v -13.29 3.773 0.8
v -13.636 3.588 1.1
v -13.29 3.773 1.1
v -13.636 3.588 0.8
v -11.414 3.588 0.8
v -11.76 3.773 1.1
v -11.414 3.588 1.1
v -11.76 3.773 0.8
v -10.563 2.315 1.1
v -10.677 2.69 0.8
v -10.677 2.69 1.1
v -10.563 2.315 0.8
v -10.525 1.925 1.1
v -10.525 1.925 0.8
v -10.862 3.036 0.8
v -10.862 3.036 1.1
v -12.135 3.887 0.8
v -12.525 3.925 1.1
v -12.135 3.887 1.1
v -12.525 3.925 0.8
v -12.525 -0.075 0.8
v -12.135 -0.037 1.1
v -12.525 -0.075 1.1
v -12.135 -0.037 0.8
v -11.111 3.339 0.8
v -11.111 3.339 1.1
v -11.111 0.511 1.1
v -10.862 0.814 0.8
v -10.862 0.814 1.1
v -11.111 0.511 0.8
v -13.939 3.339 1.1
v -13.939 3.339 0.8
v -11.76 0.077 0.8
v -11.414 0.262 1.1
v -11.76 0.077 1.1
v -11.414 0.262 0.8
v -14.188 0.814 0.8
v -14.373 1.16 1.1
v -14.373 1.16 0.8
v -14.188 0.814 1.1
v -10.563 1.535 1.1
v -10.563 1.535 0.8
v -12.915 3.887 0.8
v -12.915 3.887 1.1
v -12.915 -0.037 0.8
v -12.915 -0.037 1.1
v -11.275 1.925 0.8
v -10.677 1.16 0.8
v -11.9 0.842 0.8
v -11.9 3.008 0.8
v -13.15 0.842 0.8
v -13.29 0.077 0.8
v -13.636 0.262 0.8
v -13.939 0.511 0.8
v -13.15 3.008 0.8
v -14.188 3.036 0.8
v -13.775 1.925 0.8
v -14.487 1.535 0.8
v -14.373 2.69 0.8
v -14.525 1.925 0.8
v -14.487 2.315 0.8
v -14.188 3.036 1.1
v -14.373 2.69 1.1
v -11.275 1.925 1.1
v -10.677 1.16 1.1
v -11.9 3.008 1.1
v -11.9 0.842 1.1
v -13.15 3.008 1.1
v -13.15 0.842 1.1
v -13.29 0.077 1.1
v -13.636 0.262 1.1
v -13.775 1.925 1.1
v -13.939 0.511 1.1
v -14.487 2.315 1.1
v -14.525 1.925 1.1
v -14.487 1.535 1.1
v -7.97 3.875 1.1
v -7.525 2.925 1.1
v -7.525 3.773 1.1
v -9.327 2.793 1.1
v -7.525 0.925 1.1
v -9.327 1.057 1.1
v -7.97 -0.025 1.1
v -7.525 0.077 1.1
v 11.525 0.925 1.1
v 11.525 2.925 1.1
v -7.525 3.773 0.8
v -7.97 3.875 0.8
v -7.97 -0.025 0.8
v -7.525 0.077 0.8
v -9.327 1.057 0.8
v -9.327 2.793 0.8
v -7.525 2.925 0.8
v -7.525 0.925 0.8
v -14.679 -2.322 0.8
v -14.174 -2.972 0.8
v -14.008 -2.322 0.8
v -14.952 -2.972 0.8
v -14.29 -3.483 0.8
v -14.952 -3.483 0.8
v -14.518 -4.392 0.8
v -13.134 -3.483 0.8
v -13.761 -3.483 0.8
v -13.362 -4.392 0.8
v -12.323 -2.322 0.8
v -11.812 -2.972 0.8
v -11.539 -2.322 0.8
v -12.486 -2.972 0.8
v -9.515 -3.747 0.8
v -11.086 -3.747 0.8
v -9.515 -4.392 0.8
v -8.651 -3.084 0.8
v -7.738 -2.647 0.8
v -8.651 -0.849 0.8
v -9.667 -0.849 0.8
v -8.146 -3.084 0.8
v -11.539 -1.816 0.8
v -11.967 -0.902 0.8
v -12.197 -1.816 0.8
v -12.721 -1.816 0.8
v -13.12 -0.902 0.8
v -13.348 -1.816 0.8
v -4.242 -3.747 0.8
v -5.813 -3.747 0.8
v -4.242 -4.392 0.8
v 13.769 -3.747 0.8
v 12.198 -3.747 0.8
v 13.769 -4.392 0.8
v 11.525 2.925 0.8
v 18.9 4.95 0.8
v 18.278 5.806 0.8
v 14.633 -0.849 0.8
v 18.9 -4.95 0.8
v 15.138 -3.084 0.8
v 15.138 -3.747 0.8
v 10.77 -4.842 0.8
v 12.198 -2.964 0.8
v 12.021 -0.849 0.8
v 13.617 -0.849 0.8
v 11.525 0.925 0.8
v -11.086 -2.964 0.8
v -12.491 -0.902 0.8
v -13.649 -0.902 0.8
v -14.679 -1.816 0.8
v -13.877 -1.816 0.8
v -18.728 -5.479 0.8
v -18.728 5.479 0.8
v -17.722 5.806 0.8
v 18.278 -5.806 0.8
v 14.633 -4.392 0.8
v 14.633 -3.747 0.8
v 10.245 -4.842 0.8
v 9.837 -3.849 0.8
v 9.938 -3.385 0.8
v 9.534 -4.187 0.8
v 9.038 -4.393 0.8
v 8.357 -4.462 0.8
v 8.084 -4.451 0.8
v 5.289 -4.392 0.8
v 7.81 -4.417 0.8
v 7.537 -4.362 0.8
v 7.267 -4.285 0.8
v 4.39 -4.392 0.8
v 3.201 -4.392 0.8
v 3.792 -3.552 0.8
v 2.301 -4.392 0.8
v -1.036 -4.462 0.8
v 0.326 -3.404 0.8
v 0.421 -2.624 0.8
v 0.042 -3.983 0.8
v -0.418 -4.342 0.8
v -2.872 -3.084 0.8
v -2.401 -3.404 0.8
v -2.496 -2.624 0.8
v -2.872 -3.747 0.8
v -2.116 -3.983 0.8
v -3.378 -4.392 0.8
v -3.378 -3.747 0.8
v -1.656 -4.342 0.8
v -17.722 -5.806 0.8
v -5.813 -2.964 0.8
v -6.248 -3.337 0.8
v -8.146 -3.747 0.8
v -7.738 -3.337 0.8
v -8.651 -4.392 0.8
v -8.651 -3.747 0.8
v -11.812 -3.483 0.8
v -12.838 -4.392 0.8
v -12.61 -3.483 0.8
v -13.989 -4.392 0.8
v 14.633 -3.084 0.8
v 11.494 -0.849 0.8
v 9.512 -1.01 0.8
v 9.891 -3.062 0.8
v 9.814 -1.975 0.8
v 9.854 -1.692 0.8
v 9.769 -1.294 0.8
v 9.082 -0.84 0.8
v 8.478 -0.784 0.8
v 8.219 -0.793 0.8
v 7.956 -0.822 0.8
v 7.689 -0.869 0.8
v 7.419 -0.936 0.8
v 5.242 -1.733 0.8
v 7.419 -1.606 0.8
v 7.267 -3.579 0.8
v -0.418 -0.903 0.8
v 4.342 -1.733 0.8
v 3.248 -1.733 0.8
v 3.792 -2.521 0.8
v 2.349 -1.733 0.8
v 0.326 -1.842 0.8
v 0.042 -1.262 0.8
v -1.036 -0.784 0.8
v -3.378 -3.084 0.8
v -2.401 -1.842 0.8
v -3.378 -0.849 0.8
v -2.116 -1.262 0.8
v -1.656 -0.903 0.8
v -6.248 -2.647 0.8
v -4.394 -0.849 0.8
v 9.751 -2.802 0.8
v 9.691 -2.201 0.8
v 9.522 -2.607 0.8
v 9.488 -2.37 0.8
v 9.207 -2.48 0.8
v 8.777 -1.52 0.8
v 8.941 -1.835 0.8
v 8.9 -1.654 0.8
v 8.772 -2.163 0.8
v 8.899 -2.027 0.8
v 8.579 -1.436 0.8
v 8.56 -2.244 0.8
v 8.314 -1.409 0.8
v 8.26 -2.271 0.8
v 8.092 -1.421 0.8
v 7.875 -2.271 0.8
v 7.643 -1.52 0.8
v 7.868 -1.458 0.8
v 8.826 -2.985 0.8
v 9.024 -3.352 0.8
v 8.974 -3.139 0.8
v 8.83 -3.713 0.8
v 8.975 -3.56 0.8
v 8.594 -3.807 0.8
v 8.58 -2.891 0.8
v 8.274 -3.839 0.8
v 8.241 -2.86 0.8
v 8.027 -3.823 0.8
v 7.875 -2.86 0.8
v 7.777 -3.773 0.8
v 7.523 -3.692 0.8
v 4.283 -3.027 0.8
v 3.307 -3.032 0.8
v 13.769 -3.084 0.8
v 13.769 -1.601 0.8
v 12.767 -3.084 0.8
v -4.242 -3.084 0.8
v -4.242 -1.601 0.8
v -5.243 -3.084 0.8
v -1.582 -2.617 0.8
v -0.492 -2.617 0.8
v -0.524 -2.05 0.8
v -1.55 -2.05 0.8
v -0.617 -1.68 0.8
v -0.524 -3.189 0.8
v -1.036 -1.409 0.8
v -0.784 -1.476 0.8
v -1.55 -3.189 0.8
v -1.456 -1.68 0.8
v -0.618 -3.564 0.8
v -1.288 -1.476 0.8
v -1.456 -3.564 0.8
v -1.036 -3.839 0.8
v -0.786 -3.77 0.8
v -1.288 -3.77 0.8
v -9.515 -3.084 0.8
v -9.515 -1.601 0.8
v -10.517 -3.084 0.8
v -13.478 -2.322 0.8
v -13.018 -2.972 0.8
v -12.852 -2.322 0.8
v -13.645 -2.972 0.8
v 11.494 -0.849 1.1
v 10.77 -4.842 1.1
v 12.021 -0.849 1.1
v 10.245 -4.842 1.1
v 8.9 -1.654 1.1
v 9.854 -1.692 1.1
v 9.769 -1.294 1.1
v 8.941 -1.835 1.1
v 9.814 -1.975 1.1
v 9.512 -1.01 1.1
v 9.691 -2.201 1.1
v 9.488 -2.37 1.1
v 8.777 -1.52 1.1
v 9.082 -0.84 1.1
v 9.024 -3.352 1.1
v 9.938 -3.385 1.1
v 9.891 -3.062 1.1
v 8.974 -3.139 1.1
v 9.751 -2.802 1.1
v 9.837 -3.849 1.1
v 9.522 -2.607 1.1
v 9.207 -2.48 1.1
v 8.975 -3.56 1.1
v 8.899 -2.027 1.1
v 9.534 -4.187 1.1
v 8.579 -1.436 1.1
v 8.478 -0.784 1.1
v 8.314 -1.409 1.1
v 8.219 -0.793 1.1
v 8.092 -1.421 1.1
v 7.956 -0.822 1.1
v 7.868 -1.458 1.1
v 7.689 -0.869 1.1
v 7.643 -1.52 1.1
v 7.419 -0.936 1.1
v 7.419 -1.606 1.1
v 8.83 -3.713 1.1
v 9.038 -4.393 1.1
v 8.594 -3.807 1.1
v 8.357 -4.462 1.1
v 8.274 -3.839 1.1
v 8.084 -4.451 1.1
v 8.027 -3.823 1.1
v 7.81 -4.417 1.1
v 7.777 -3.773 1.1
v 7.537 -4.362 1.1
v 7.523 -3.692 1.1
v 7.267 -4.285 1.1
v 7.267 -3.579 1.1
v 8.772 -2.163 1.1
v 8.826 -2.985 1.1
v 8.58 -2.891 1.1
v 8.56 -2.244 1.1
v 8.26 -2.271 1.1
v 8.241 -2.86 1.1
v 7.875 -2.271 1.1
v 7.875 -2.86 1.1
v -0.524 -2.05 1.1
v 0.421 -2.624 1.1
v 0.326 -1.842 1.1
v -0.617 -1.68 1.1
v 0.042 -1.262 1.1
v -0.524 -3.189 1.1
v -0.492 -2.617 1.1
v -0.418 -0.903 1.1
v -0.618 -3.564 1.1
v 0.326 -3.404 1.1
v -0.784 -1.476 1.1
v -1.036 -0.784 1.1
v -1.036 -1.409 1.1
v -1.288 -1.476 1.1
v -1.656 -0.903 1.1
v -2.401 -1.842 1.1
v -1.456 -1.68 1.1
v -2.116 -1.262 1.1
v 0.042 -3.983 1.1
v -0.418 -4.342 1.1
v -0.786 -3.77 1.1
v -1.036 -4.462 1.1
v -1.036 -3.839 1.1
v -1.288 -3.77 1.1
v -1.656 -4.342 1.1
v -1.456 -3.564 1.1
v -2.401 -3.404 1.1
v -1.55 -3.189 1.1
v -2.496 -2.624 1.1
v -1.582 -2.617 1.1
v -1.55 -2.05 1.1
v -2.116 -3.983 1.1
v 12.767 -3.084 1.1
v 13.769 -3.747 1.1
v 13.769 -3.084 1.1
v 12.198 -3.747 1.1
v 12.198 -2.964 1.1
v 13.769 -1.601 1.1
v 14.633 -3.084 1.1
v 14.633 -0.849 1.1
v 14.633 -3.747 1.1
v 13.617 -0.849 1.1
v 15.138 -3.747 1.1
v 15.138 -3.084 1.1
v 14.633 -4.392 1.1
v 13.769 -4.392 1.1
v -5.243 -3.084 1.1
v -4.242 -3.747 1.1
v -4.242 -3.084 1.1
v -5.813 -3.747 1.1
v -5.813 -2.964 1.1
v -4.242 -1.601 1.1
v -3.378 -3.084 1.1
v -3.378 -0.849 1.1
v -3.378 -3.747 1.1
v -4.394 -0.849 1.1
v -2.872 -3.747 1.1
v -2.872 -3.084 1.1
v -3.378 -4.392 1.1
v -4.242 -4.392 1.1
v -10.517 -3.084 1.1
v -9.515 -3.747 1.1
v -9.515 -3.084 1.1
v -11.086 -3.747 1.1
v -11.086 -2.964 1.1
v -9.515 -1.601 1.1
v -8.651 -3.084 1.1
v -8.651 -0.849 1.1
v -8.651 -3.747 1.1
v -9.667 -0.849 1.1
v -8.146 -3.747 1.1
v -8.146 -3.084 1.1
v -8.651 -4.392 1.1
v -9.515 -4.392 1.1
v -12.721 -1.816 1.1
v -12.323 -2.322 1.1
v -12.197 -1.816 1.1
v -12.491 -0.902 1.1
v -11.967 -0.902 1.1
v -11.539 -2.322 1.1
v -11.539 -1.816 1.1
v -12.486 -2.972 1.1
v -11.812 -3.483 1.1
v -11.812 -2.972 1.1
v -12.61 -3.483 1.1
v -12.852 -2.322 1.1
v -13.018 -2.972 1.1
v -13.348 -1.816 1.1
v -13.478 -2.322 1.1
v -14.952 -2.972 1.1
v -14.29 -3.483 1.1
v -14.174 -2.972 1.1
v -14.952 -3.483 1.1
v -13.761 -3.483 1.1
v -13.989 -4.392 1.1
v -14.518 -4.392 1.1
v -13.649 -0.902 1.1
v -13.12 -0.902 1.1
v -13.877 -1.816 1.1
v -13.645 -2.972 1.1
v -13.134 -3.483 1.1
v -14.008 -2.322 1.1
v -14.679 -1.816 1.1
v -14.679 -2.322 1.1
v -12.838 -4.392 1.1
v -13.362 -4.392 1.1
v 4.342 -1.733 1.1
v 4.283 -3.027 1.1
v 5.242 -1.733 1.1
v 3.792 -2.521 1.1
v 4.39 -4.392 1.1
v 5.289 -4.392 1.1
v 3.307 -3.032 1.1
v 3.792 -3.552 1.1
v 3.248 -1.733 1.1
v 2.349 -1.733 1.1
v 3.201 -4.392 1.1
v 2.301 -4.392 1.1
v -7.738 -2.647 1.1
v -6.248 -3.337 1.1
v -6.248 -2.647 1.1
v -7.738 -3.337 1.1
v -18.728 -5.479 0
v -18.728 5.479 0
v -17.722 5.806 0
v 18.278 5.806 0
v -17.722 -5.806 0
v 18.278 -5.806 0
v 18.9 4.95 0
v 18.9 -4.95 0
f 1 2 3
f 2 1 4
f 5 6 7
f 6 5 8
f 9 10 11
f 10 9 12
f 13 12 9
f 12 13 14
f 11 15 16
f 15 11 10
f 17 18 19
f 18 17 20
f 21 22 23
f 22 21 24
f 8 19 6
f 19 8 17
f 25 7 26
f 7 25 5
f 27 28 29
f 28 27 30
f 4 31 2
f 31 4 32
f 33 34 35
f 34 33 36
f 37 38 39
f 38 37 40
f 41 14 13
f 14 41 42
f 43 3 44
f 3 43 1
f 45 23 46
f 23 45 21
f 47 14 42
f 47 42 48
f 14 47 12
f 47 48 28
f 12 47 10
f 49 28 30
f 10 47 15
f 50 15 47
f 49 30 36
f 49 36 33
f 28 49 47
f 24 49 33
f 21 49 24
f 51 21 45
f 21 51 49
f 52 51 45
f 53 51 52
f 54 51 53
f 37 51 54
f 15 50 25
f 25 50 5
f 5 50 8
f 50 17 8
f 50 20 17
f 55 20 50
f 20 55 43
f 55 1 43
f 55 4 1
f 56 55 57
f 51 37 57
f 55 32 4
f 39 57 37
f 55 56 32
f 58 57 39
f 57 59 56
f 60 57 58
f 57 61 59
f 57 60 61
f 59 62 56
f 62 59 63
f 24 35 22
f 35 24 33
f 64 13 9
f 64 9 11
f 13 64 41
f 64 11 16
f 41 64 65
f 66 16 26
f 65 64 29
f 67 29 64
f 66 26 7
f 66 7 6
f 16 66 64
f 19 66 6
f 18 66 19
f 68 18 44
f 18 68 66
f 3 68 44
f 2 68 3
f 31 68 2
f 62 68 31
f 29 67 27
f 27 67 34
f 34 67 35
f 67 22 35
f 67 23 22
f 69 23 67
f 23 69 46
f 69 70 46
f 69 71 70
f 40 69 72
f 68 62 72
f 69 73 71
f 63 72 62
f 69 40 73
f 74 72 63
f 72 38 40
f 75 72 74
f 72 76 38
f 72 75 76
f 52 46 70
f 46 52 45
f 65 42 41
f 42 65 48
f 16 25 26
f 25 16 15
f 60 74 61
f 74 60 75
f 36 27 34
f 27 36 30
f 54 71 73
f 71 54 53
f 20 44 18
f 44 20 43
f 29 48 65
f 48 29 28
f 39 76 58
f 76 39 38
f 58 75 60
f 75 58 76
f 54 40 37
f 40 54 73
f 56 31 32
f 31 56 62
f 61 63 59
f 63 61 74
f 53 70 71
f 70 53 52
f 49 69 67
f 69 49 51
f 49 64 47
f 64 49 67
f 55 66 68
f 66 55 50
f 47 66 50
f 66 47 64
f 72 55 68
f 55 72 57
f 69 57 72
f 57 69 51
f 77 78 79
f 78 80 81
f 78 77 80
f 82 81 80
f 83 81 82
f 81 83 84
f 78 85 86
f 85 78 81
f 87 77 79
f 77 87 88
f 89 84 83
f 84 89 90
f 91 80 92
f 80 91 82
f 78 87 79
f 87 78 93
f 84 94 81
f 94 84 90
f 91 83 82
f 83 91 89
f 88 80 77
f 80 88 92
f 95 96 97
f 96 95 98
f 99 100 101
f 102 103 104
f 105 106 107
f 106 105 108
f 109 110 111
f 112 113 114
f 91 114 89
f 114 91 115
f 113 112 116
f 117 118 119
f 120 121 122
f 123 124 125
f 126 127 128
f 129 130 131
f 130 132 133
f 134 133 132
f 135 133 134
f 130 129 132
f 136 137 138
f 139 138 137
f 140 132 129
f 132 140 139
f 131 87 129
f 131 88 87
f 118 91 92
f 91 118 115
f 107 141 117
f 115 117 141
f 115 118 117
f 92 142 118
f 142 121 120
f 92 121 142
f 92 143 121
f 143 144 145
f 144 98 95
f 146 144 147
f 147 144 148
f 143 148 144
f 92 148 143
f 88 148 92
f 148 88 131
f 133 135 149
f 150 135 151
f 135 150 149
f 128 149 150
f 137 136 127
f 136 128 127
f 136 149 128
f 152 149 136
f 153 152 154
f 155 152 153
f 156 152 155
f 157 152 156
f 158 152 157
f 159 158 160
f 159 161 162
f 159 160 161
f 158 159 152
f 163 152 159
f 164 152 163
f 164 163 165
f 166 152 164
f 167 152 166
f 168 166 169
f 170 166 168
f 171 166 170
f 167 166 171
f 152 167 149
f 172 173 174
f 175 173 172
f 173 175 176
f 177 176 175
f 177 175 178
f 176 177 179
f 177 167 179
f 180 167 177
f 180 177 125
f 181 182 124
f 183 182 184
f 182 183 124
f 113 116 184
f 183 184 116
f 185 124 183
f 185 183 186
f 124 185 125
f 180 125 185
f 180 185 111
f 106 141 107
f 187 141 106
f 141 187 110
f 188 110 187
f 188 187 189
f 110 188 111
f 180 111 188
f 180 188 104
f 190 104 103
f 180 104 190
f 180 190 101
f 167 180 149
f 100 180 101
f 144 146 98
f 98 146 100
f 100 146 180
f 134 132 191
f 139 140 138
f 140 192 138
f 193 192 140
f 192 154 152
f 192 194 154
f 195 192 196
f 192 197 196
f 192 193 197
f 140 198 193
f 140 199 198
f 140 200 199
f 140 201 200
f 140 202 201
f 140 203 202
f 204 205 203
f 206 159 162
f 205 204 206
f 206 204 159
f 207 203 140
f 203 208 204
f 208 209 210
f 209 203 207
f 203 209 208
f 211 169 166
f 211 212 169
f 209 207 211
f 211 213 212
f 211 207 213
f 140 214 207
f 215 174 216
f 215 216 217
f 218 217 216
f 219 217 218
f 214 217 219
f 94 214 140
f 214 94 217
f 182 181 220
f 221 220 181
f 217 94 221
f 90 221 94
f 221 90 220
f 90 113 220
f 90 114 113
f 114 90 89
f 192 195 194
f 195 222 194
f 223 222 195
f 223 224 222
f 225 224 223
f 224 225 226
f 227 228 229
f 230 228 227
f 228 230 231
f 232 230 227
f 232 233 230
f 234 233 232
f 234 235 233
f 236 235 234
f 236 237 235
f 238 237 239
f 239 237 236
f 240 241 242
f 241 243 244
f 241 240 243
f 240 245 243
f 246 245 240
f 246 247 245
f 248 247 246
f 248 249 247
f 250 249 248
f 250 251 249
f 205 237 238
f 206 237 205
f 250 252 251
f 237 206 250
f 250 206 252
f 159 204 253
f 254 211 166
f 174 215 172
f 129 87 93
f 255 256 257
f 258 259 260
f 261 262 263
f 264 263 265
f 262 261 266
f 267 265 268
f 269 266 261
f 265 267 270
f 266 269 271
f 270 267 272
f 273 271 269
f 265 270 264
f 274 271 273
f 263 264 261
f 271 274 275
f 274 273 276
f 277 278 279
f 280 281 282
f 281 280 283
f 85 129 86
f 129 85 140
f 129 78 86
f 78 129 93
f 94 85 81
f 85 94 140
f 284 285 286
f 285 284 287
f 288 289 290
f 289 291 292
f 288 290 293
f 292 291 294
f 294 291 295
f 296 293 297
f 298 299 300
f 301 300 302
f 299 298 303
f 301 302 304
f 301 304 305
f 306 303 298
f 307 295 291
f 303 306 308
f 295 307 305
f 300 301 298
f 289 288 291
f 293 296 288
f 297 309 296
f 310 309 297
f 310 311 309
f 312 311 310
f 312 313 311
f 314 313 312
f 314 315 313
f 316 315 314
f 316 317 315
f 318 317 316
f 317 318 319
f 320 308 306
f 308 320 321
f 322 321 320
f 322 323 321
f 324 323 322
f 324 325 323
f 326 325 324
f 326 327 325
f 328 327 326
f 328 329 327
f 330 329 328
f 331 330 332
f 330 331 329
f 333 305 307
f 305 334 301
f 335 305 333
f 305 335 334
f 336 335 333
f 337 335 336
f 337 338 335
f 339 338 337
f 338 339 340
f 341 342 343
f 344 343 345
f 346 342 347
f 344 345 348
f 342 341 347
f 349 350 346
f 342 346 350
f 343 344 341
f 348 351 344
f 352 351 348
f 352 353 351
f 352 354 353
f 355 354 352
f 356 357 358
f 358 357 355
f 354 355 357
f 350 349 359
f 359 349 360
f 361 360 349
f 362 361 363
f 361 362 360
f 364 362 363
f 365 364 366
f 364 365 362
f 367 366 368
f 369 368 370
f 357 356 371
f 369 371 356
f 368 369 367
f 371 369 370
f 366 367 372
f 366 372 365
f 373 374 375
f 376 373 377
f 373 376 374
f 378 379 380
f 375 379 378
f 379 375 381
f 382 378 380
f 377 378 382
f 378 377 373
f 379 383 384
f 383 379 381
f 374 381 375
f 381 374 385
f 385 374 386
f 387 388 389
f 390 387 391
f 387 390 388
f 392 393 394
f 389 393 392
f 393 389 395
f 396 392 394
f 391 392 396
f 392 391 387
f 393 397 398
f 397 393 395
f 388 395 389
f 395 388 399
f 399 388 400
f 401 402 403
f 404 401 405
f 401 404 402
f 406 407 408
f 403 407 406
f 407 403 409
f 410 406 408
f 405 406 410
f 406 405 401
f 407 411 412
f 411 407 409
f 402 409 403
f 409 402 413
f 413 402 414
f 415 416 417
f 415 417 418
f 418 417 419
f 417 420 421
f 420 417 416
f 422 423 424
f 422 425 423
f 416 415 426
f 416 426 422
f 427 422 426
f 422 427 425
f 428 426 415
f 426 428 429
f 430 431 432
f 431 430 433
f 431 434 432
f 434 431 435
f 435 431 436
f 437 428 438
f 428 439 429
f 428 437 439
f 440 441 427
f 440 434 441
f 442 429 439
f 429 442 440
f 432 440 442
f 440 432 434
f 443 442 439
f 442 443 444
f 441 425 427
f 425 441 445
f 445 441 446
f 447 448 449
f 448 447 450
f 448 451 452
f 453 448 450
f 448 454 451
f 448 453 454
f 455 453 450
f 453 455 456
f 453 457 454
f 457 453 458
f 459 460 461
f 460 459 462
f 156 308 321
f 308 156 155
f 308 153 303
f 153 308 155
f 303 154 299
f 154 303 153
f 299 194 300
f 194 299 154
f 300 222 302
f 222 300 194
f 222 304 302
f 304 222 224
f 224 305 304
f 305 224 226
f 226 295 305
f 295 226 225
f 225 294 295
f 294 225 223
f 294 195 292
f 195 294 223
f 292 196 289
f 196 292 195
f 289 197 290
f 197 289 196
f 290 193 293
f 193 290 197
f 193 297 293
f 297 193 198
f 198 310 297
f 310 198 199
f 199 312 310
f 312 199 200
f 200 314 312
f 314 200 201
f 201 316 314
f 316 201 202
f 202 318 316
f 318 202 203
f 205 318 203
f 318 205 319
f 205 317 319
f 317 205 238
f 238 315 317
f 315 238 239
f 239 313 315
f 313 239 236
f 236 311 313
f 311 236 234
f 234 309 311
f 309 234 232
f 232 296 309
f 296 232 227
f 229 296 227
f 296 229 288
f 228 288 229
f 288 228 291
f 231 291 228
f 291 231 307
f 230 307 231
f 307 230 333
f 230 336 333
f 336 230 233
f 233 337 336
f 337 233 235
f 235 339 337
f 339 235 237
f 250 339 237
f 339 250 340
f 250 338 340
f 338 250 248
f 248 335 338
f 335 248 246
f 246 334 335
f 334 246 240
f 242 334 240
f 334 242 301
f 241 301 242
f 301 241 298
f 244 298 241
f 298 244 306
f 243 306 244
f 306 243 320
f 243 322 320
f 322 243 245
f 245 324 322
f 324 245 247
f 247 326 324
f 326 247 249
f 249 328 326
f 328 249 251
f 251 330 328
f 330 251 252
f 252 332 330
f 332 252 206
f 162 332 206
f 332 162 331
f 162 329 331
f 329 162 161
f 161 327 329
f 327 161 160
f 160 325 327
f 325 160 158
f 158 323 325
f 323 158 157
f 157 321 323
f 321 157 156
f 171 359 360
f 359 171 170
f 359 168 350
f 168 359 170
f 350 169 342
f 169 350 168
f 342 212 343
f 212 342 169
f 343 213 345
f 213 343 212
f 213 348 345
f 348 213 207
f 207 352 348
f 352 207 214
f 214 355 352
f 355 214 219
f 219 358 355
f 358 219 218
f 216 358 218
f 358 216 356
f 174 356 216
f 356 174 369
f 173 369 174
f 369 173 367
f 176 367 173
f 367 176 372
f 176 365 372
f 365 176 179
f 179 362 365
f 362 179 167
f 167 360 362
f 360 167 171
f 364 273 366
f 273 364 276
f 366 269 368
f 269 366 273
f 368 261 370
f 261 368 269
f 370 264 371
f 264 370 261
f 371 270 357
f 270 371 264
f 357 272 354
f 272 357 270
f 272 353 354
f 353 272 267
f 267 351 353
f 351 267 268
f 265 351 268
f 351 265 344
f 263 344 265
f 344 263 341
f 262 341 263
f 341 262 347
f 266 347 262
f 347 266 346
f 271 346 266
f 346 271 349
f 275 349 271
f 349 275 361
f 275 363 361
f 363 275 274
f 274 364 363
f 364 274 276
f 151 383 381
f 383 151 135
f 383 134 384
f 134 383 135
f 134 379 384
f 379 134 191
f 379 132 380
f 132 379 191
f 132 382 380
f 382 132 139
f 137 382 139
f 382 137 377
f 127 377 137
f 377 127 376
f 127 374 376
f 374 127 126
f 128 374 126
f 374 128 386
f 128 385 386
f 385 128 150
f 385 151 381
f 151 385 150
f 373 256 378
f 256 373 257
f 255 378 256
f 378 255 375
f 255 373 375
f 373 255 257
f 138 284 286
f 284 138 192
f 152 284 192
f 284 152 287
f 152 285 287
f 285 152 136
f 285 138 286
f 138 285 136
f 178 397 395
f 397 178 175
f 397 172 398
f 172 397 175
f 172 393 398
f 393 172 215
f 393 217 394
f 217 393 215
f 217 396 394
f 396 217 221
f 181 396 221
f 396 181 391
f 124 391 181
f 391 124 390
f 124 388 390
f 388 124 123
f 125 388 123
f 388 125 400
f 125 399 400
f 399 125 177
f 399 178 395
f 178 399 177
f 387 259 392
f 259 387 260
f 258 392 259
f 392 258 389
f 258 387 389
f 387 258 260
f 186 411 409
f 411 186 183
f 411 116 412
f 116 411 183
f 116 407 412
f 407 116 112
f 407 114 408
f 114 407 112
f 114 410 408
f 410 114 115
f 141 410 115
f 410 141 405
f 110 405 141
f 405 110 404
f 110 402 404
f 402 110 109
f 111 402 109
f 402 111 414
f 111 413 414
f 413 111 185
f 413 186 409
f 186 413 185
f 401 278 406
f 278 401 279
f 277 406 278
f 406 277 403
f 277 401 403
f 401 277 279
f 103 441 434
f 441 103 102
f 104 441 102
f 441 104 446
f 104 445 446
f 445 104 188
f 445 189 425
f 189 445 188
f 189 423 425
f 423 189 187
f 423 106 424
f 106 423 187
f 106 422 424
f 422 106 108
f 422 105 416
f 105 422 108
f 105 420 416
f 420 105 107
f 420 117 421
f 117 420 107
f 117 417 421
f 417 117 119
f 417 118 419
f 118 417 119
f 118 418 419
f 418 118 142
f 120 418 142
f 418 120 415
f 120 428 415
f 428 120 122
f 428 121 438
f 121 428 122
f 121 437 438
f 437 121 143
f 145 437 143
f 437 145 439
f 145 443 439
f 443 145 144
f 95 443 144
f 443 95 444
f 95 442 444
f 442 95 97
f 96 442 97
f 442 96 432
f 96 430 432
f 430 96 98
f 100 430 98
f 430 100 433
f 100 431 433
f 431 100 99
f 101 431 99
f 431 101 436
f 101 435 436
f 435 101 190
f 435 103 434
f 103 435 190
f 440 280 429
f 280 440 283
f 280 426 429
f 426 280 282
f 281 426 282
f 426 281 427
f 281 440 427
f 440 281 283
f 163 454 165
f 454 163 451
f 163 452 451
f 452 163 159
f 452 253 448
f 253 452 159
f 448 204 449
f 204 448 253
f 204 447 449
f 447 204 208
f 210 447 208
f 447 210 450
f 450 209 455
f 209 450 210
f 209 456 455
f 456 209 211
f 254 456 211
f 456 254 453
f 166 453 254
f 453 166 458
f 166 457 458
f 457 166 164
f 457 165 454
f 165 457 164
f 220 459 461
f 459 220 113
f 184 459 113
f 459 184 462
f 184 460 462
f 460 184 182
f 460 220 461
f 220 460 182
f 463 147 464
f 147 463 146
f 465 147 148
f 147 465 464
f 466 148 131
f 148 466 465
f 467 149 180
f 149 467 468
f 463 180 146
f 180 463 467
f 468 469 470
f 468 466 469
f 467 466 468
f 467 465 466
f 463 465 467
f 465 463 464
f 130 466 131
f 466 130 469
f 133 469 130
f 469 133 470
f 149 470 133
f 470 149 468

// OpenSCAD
////////////////////////////////////////////////////////
//        Parts Bin Label Generator - IMPERIAL        //
//         Fractional & Machine Screw Support         //
//            Version 16 - Batch All Sizes            //
////////////////////////////////////////////////////////

/* [Single Label Mode] */
hardware_type = "Button head screw"; // [Phillips head bolt, Socket head bolt, Hex head bolt, Button head screw, Torx head bolt, Phillips head countersunk, Torx head countersunk, Socket head countersunk, Phillips wood screw, Torx wood screw, Wall anchor, Heat set insert, Standard nut, Lock nut, Standard washer, Spring washer, Custom text, None]
thread_spec = "#4-40"; // [#4-40, #4-48, #5-40, #5-44, #6-32, #6-40, #8-32, #8-36, #10-24, #10-32, #12-24, #12-28, 1/4-20, 1/4-28, 5/16-18, 5/16-24, 3/8-16, 3/8-24, 7/16-14, 7/16-20, 1/2-13, 1/2-20, 9/16-12, 9/16-18, 5/8-11, 5/8-18, 3/4-10, 3/4-16, 7/8-9, 7/8-14, 1-8, 1-12]
length_fraction = "3/4"; // [1/4, 5/16, 3/8, 7/16, 1/2, 9/16, 5/8, 11/16, 3/4, 13/16, 7/8, 15/16, 1, 1-1/16, 1-1/8, 1-3/16, 1-1/4, 1-5/16, 1-3/8, 1-7/16, 1-1/2, 1-9/16, 1-5/8, 1-11/16, 1-3/4, 1-13/16, 1-7/8, 1-15/16, 2]
custom_display_text = ""; // Custom text override (leave blank for auto-generation)
custom_text_only = "Custom"; // Used only when hardware_type is "Custom text"

/* [Batch All Sizes Mode] */
enable_batch_all_sizes = false;
batch_hardware_type = "Phillips head screw"; // [Phillips head screw, Socket head bolt, Hex head bolt, Button head screw, Torx head bolt, Phillips head countersunk, Torx head countersunk, Socket head countersunk, Phillips wood screw, Torx wood screw, Wall anchor, Heat set insert, Standard nut, Lock nut, Standard washer, Spring washer]
batch_thread_spec = "#4-40"; // [#4-40, #4-48, #5-40, #5-44, #6-32, #6-40, #8-32, #8-36, #10-24, #10-32, #12-24, #12-28, 1/4-20, 1/4-28, 5/16-18, 5/16-24, 3/8-16, 3/8-24, 7/16-14, 7/16-20, 1/2-13, 1/2-20, 9/16-12, 9/16-18, 5/8-11, 5/8-18, 3/4-10, 3/4-16, 7/8-9, 7/8-14, 1-8, 1-12]

/* [Label Properties] */
label_units = 1; // [1:Small (37.8mm), 2:Medium (75.6mm), 3:Large (113.4mm)]
base_color = "#FFFFFF"; // Base label color
content_color = "#000000"; // Text and icon color
export_mode = "Complete"; // [Complete, Base only, Content only]

/* [Typography] */
font_family = "Roboto"; // [Arial, Roboto, Open Sans, Noto Sans, Liberation Sans]
font_weight = "Bold"; // [Regular, Bold, Light, Medium]
text_size = 3.5;

/* [Advanced Settings] */
label_width = 11.7;
label_thickness = 0.8;
corner_radius = 0.9;
edge_chamfer = 0.2;
raised_height = 0.3;

// Internal calculations
label_length = (label_units == 1) ? 37.8 : (label_units == 2) ? 75.6 : 113.4;
text_height = raised_height;
font_string = str(font_family, ":style=", font_weight);
max_bolt_length = 20 * label_units;
max_text_width = label_length - 4; // Leave 2mm margin on each side for text

// Batch spacing calculations
grid_columns = (label_units == 1) ? 6 : (label_units == 2) ? 3 : 2;
h_spacing = label_length + 1; // 1mm gap between labels horizontally
v_spacing = label_width + 1;  // 1mm gap between labels vertically

// All fractional sizes for batch generation
all_fractional_sizes = ["1/4", "5/16", "3/8", "7/16", "1/2", "9/16", "5/8", "11/16", "3/4", "13/16", "7/8", "15/16", "1", "1-1/16", "1-1/8", "1-3/16", "1-1/4", "1-5/16", "1-3/8", "1-7/16", "1-1/2", "1-9/16", "1-5/8", "1-11/16", "1-3/4", "1-13/16", "1-7/8", "1-15/16", "2"];

////////////////////////////////////////////////////////
//         IMPERIAL SYSTEM FUNCTIONS                 //
////////////////////////////////////////////////////////

function imperial_to_mm(inches) = inches * 25.4;

// Convert fractional string to decimal
function fraction_to_decimal(frac_str) =
    (frac_str == "1/4") ? 0.25 :
    (frac_str == "5/16") ? 0.3125 :
    (frac_str == "3/8") ? 0.375 :
    (frac_str == "7/16") ? 0.4375 :
    (frac_str == "1/2") ? 0.5 :
    (frac_str == "9/16") ? 0.5625 :
    (frac_str == "5/8") ? 0.625 :
    (frac_str == "11/16") ? 0.6875 :
    (frac_str == "3/4") ? 0.75 :
    (frac_str == "13/16") ? 0.8125 :
    (frac_str == "7/8") ? 0.875 :
    (frac_str == "15/16") ? 0.9375 :
    (frac_str == "1") ? 1.0 :
    (frac_str == "1-1/16") ? 1.0625 :
    (frac_str == "1-1/8") ? 1.125 :
    (frac_str == "1-3/16") ? 1.1875 :
    (frac_str == "1-1/4") ? 1.25 :
    (frac_str == "1-5/16") ? 1.3125 :
    (frac_str == "1-3/8") ? 1.375 :
    (frac_str == "1-7/16") ? 1.4375 :
    (frac_str == "1-1/2") ? 1.5 :
    (frac_str == "1-9/16") ? 1.5625 :
    (frac_str == "1-5/8") ? 1.625 :
    (frac_str == "1-11/16") ? 1.6875 :
    (frac_str == "1-3/4") ? 1.75 :
    (frac_str == "1-13/16") ? 1.8125 :
    (frac_str == "1-7/8") ? 1.875 :
    (frac_str == "1-15/16") ? 1.9375 :
    (frac_str == "2") ? 2.0 :
    0.75; // Default fallback

function is_nut_or_washer_type(type) =
    type == "Standard nut" || 
    type == "Lock nut" || 
    type == "Standard washer" || 
    type == "Spring washer";

////////////////////////////////////////////////////////
//                 MAIN EXECUTION                    //
////////////////////////////////////////////////////////

if (enable_batch_all_sizes) {
    generate_batch_all_sizes();
} else {
    // Single label mode
    length_inches = fraction_to_decimal(length_fraction);
    length_mm = length_inches * 25.4;
    
    // FIXED: Now properly handles custom text for nuts/washers
    final_display_text = (custom_display_text != "") ? custom_display_text :
        is_nut_or_washer_type(hardware_type) ? thread_spec :  // Changed from "" to thread_spec
        str(thread_spec, " x ", length_fraction);

    create_single_label(
        type = hardware_type,
        thread = thread_spec,
        display_text = final_display_text,
        length_mm = length_mm
    );
}

////////////////////////////////////////////////////////
//            BATCH ALL SIZES GENERATION             //
////////////////////////////////////////////////////////

module generate_batch_all_sizes() {
    num_sizes = len(all_fractional_sizes);
    
    for (i = [0 : num_sizes - 1]) {
        size_fraction = all_fractional_sizes[i];
        length_inches = fraction_to_decimal(size_fraction);
        length_mm = length_inches * 25.4;
        
        // Calculate grid position
        row = floor(i / grid_columns);
        col = i % grid_columns;
        
        // Position label in grid with tight spacing
        translate([col * h_spacing, -row * v_spacing, 0]) {
            // Generate display text - use batch parameters, not defaults
            // FIXED: Also updated batch mode to use thread_spec for nuts/washers
            final_display_text = is_nut_or_washer_type(batch_hardware_type) ? batch_thread_spec :
                str(batch_thread_spec, " x ", size_fraction);
                
            create_single_label(
                type = batch_hardware_type,
                thread = batch_thread_spec,
                display_text = final_display_text,
                length_mm = length_mm
            );
        }
    }
}

////////////////////////////////////////////////////////
//              SINGLE LABEL CREATION                //
////////////////////////////////////////////////////////

module create_single_label(type, thread, display_text, length_mm) {
    // Base structure
    if (export_mode == "Complete" || export_mode == "Base only") {
        color(base_color) {
            label_base();
        }
    }
    
    // Content (text and icons)
    if (export_mode == "Complete" || export_mode == "Content only") {
        color(content_color) {
            label_content(type, thread, display_text, length_mm);
        }
    }
}

////////////////////////////////////////////////////////
//                LABEL BASE                         //
////////////////////////////////////////////////////////

module label_base() {
    // Main label body with rounded corners (no mounting holes)
    hull() {
        for (x = [-label_length/2 + corner_radius, label_length/2 - corner_radius]) {
            for (y = [-label_width/2 + corner_radius, label_width/2 - corner_radius]) {
                translate([x, y, 0]) {
                    cylinder(h = label_thickness, r = corner_radius);
                }
            }
        }
    }
}

////////////////////////////////////////////////////////
//               LABEL CONTENT                       //
////////////////////////////////////////////////////////

module label_content(type, thread, display_text, length_mm) {
    if (type == "Custom text") {
        render_text(custom_text_only);
    } else if (is_nut_or_washer_type(type)) {
        render_hardware_icon(type, length_mm);
        // FIXED: Now uses display_text instead of thread
        render_text(display_text);
    } else {
        // Bolts and screws
        render_hardware_icon(type, length_mm);
        render_text(display_text);
    }
}

////////////////////////////////////////////////////////
//                TEXT RENDERING                     //
////////////////////////////////////////////////////////

module render_text(text_content) {
    translate([0, -label_width/2 + 3, label_thickness]) {
        linear_extrude(height = text_height) {
            text(text_content, 
                 size = text_size,
                 font = font_string,
                 halign = "center",
                 valign = "center");
        }
    }
}

////////////////////////////////////////////////////////
//               HARDWARE ICONS                      //
////////////////////////////////////////////////////////

module render_hardware_icon(type, length_mm) {
    icon_y_pos = label_width/4-1;  // Position icon closer to center and further from text
    
    if (type == "Phillips head screw") {
        phillips_bolt_icon(length_mm, icon_y_pos);
    } else if (type == "Socket head bolt") {
        socket_bolt_icon(length_mm, icon_y_pos);
    } else if (type == "Hex head bolt") {
        hex_bolt_icon(length_mm, icon_y_pos);
    } else if (type == "Button head screw") {
        button_bolt_icon(length_mm, icon_y_pos);
    } else if (type == "Torx head bolt") {
        torx_bolt_icon(length_mm, icon_y_pos);
    } else if (type == "Phillips head countersunk") {
        phillips_countersunk_icon(length_mm, icon_y_pos);
    } else if (type == "Torx head countersunk") {
        torx_countersunk_icon(length_mm, icon_y_pos);
    } else if (type == "Socket head countersunk") {
        socket_countersunk_icon(length_mm, icon_y_pos);
    } else if (type == "Phillips wood screw") {
        phillips_wood_screw_icon(length_mm, icon_y_pos);
    } else if (type == "Torx wood screw") {
        torx_wood_screw_icon(length_mm, icon_y_pos);
    } else if (type == "Wall anchor") {
        wall_anchor_icon(length_mm, icon_y_pos);
    } else if (type == "Heat set insert") {
        heat_insert_icon(length_mm, icon_y_pos);
    } else if (type == "Standard nut") {
        standard_nut_icon(icon_y_pos);
    } else if (type == "Lock nut") {
        lock_nut_icon(icon_y_pos);
    } else if (type == "Standard washer") {
        standard_washer_icon(icon_y_pos);
    } else if (type == "Spring washer") {
        spring_washer_icon(icon_y_pos);
    }
}

////////////////////////////////////////////////////////
//              BOLT STEM HELPER                     //
////////////////////////////////////////////////////////

module bolt_stem(length_mm, start_x, y_pos, stem_width = 2.0) {
    effective_length = min(length_mm, max_bolt_length);
    z_pos = label_thickness;
    
    if (length_mm > max_bolt_length) {
        // Split stem for long bolts
        gap = 2;
        segment_len = (effective_length - gap) / 2;
        
        translate([start_x, y_pos - stem_width/2, z_pos]) {
            cube([segment_len, stem_width, text_height]);
        }
        
        translate([start_x + segment_len + gap, y_pos - stem_width/2, z_pos]) {
            cube([segment_len, stem_width, text_height]);
        }
    } else {
        translate([start_x, y_pos - stem_width/2, z_pos]) {
            cube([effective_length, stem_width, text_height]);
        }
    }
}

////////////////////////////////////////////////////////
//               PHILLIPS HEAD ICONS                 //
////////////////////////////////////////////////////////

module phillips_bolt_icon(length_mm, y_pos) {
    head_x = -min(length_mm, max_bolt_length)/2 - 3;
    z_pos = label_thickness;
    
    // Top view - round head with Phillips cross
    translate([head_x, y_pos, z_pos]) {
        difference() {
            cylinder(h = text_height, d = 4, $fn = 32);  // Round head
            translate([-1.5, -0.3, 0]) cube([3, 0.6, text_height]);
            translate([-0.3, -1.5, 0]) cube([0.6, 3, text_height]);
        }
    }
    
    // Side view - cylindrical head
    translate([head_x + 3, y_pos - 2, z_pos]) {
        cube([2, 4, text_height]);
    }
    
    bolt_stem(length_mm, head_x + 5, y_pos);
}

module phillips_countersunk_icon(length_mm, y_pos) {
    head_x = -min(length_mm, max_bolt_length)/2 - 2;
    z_pos = label_thickness;
    
    // Top view - round head with Phillips cross
    translate([head_x, y_pos, z_pos]) {
        difference() {
            cylinder(h = text_height, d = 4, $fn = 32);  // Round head
            translate([-1.5, -0.3, 0]) cube([3, 0.6, text_height]);
            translate([-0.3, -1.5, 0]) cube([0.6, 3, text_height]);
        }
    }
    
    // Side view - angled countersunk profile
    translate([head_x + 3, y_pos, z_pos]) {
        linear_extrude(height = text_height) {
            polygon(points = [[0, -2], [2.5, 0], [0, 2]]);
        }
    }
    
    bolt_stem(length_mm, head_x + 4, y_pos);
}

module phillips_wood_screw_icon(length_mm, y_pos) {
    head_x = -min(length_mm, max_bolt_length)/2 - 2;
    z_pos = label_thickness;
    
    translate([head_x, y_pos, z_pos]) {
        difference() {
            cylinder(h = text_height, d = 4);
            translate([-1.5, -0.3, 0]) cube([3, 0.6, text_height]);
            translate([-0.3, -1.5, 0]) cube([0.6, 3, text_height]);
        }
    }
    
    translate([head_x + 3, y_pos, z_pos]) {
        linear_extrude(height = text_height) {
            polygon(points = [[0, -2], [2.5, 0], [0, 2]]);
        }
    }
    
    stem_length = max(0, length_mm - 2);
    if (stem_length > 0) {
        bolt_stem(stem_length, head_x + 4, y_pos);
        
        tip_x = head_x + 4 + min(stem_length, max_bolt_length);
        translate([tip_x, y_pos, z_pos]) {
            linear_extrude(height = text_height) {
                polygon(points = [[0, -1], [1.5, 0], [0, 1]]);
            }
        }
    }
}

////////////////////////////////////////////////////////
//                SOCKET HEAD ICONS                  //
////////////////////////////////////////////////////////

module socket_bolt_icon(length_mm, y_pos) {
    head_x = -min(length_mm, max_bolt_length)/2 - 3;
    z_pos = label_thickness;
    
    // Top view - round head with hex socket
    translate([head_x, y_pos, z_pos]) {
        difference() {
            cylinder(h = text_height, d = 4, $fn = 32);  // Round head
            cylinder(h = text_height, d = 2.5, $fn = 6);  // Hex socket
        }
    }
    
    // Side view - cylindrical head
    translate([head_x + 3, y_pos - 2, z_pos]) {
        cube([3, 4, text_height]);
    }
    
    bolt_stem(length_mm, head_x + 5, y_pos);
}

module socket_countersunk_icon(length_mm, y_pos) {
    head_x = -min(length_mm, max_bolt_length)/2 - 2;
    z_pos = label_thickness;
    
    translate([head_x, y_pos, z_pos]) {
        difference() {
            cylinder(h = text_height, d = 4);
            cylinder(h = text_height, d = 2.5, $fn = 6);
        }
    }
    
    translate([head_x + 3, y_pos, z_pos]) {
        linear_extrude(height = text_height) {
            polygon(points = [[0, -2], [2.5, 0], [0, 2]]);
        }
    }
    
    bolt_stem(length_mm, head_x + 4, y_pos);
}

////////////////////////////////////////////////////////
//                HEX HEAD ICON                      //
////////////////////////////////////////////////////////

module hex_bolt_icon(length_mm, y_pos) {
    head_x = -min(length_mm, max_bolt_length)/2 - 3;
    z_pos = label_thickness;
    
    translate([head_x, y_pos, z_pos]) {
        cylinder(h = text_height, d = 4, $fn = 6);
    }
    
    translate([head_x + 3, y_pos - 2, z_pos]) {
        cube([2.5, 4, text_height]);
    }
    
    bolt_stem(length_mm, head_x + 4.5, y_pos);
}

////////////////////////////////////////////////////////
//               BUTTON HEAD ICON                    //
////////////////////////////////////////////////////////

module button_bolt_icon(length_mm, y_pos) {
    head_x = -min(length_mm, max_bolt_length)/2 - 3;
    z_pos = label_thickness;
    
    // Top view - round head with hex socket
    translate([head_x, y_pos, z_pos]) {
        difference() {
            cylinder(h = text_height, d = 4, $fn = 32);  // Round head
            cylinder(h = text_height, d = 2.5, $fn = 6);  // Hex socket
        }
    }
    
    // Side view - original logic restored
    translate([head_x + 5, y_pos, z_pos]) {
        linear_extrude(height = text_height) {
            intersection() {
                circle(d = 4);
                translate([-2, -2]) square([2, 4]);
            }
        }
    }
    
    bolt_stem(length_mm, head_x + 5, y_pos);
}

////////////////////////////////////////////////////////
//                TORX HEAD ICONS                    //
////////////////////////////////////////////////////////

module torx_star(size) {
    for (i = [0:5]) {
        rotate([0, 0, i * 60]) {
            translate([0, -size/2, 0]) {
                hull() {
                    circle(d = 0.25);
                    translate([0, size, 0]) circle(d = 0.25);
                }
            }
        }
    }
}

module torx_bolt_icon(length_mm, y_pos) {
    head_x = -min(length_mm, max_bolt_length)/2 - 3;
    z_pos = label_thickness;
    
    // Top view - round head with Torx star socket
    translate([head_x, y_pos, z_pos]) {
        difference() {
            cylinder(h = text_height, d = 4, $fn = 32);  // Round head
            linear_extrude(height = text_height) torx_star(2);  // Torx star socket
        }
    }
    
    // Side view - cylindrical head
    translate([head_x + 3, y_pos - 2, z_pos]) {
        cube([3, 4, text_height]);
    }
    
    bolt_stem(length_mm, head_x + 5, y_pos);
}

module torx_countersunk_icon(length_mm, y_pos) {
    head_x = -min(length_mm, max_bolt_length)/2 - 2;
    z_pos = label_thickness;
    
    translate([head_x, y_pos, z_pos]) {
        difference() {
            cylinder(h = text_height, d = 4);
            linear_extrude(height = text_height) torx_star(2);
        }
    }
    
    translate([head_x + 3, y_pos, z_pos]) {
        linear_extrude(height = text_height) {
            polygon(points = [[0, -2], [2.5, 0], [0, 2]]);
        }
    }
    
    bolt_stem(length_mm, head_x + 4, y_pos);
}

module torx_wood_screw_icon(length_mm, y_pos) {
    head_x = -min(length_mm, max_bolt_length)/2 - 2;
    z_pos = label_thickness;
    
    translate([head_x, y_pos, z_pos]) {
        difference() {
            cylinder(h = text_height, d = 4);
            linear_extrude(height = text_height) torx_star(2);
        }
    }
    
    translate([head_x + 3, y_pos, z_pos]) {
        linear_extrude(height = text_height) {
            polygon(points = [[0, -2], [2.5, 0], [0, 2]]);
        }
    }
    
    stem_length = max(0, length_mm - 2);
    if (stem_length > 0) {
        bolt_stem(stem_length, head_x + 4, y_pos);
        
        tip_x = head_x + 4 + min(stem_length, max_bolt_length);
        translate([tip_x, y_pos, z_pos]) {
            linear_extrude(height = text_height) {
                polygon(points = [[0, -1], [1.5, 0], [0, 1]]);
            }
        }
    }
}

////////////////////////////////////////////////////////
//            SPECIALIZED HARDWARE                   //
////////////////////////////////////////////////////////

module wall_anchor_icon(length_mm, y_pos) {
    z_pos = label_thickness;
    start_x = -min(length_mm, max_bolt_length)/2 - 4;
    
    for (i = [0:4]) {
        translate([start_x + i * 1.5, y_pos, z_pos]) {
            linear_extrude(height = text_height) {
                polygon(points = [[-0.75, -1.5], [0.75, -1.25], [0.75, 1.25], [-0.75, 1.5]]);
            }
        }
    }
    
    if (length_mm > 6) {
        translate([start_x + 6, y_pos - 1.25, z_pos]) {
            cube([min(length_mm - 6, max_bolt_length - 6), 2.5, text_height]);
        }
    }
}

module heat_insert_icon(length_mm, y_pos) {
    z_pos = label_thickness;
    center_x = 0;
    
    translate([center_x - 1.5, y_pos, z_pos]) {
        difference() {
            cylinder(h = text_height, d = 3);
            cylinder(h = text_height, d = 2);
        }
    }
    
    for (i = [0:2]) {
        translate([center_x + 1.5 + i * 1.5, y_pos - 1.5, z_pos]) {
            cube([0.75, 3, text_height]);
        }
    }
}

////////////////////////////////////////////////////////
//              NUTS AND WASHERS                     //
////////////////////////////////////////////////////////

module standard_nut_icon(y_pos) {
    z_pos = label_thickness;
    center_x = 0;
    
    // Top view - hex outside, smooth circular hole inside
    translate([center_x - 1.5, y_pos, z_pos]) {
        difference() {
            cylinder(h = text_height, d = 4, $fn = 6);
            cylinder(h = text_height, d = 2.5, $fn = 32);  // Smooth circular hole
        }
    }
    
    // Side view - simple rectangular profile
    translate([center_x + 1.5, y_pos - 2, z_pos]) {
        cube([2.5, 4, text_height]);
    }
}

module lock_nut_icon(y_pos) {
    z_pos = label_thickness;
    center_x = 0;
    
    // Top view - hex outside, smooth circular hole inside
    translate([center_x - 1.5, y_pos, z_pos]) {
        difference() {
            cylinder(h = text_height, d = 4, $fn = 6);
            cylinder(h = text_height, d = 2.5, $fn = 32);  // Smooth circular hole
        }
    }
    
    // Side view - slightly taller with rounded/domed top
    translate([center_x + 1.5, y_pos - 2, z_pos]) {
        cube([2.5, 4, text_height]);
    }
    translate([center_x + 1.5, y_pos, z_pos]) {
        linear_extrude(height = text_height) {
            intersection() {
                circle(d = 4, $fn = 32);
                translate([0, -2]) square([3, 4]);
            }
        }
    }
}

module standard_washer_icon(y_pos) {
    z_pos = label_thickness;
    center_x = 0;
    
    // Top view - simple ring shape with smooth circles
    translate([center_x - 1, y_pos, z_pos]) {
        difference() {
            cylinder(h = text_height, d = 4, $fn = 32);  // Smooth outer circle
            cylinder(h = text_height, d = 2.5, $fn = 32);  // Smooth inner hole
        }
    }
    
    // Side view - thin rectangular profile
    translate([center_x + 1.5, y_pos - 2, z_pos]) {
        cube([0.75, 4, text_height]);
    }
}

module spring_washer_icon(y_pos) {
    z_pos = label_thickness;
    center_x = 0;
    
    translate([center_x - 1, y_pos, z_pos]) {
        difference() {
            cylinder(h = text_height, d = 4, $fn = 32);  // Smooth outer circle
            cylinder(h = text_height, d = 2.5, $fn = 32);  // Smooth inner hole
            translate([0, -0.3, 0]) cube([4, 0.6, text_height]);  // Gap for spring
        }
    }
    
    translate([center_x + 1.5, y_pos - 2, z_pos]) {
        cube([0.75, 4, text_height]);
    }
}
